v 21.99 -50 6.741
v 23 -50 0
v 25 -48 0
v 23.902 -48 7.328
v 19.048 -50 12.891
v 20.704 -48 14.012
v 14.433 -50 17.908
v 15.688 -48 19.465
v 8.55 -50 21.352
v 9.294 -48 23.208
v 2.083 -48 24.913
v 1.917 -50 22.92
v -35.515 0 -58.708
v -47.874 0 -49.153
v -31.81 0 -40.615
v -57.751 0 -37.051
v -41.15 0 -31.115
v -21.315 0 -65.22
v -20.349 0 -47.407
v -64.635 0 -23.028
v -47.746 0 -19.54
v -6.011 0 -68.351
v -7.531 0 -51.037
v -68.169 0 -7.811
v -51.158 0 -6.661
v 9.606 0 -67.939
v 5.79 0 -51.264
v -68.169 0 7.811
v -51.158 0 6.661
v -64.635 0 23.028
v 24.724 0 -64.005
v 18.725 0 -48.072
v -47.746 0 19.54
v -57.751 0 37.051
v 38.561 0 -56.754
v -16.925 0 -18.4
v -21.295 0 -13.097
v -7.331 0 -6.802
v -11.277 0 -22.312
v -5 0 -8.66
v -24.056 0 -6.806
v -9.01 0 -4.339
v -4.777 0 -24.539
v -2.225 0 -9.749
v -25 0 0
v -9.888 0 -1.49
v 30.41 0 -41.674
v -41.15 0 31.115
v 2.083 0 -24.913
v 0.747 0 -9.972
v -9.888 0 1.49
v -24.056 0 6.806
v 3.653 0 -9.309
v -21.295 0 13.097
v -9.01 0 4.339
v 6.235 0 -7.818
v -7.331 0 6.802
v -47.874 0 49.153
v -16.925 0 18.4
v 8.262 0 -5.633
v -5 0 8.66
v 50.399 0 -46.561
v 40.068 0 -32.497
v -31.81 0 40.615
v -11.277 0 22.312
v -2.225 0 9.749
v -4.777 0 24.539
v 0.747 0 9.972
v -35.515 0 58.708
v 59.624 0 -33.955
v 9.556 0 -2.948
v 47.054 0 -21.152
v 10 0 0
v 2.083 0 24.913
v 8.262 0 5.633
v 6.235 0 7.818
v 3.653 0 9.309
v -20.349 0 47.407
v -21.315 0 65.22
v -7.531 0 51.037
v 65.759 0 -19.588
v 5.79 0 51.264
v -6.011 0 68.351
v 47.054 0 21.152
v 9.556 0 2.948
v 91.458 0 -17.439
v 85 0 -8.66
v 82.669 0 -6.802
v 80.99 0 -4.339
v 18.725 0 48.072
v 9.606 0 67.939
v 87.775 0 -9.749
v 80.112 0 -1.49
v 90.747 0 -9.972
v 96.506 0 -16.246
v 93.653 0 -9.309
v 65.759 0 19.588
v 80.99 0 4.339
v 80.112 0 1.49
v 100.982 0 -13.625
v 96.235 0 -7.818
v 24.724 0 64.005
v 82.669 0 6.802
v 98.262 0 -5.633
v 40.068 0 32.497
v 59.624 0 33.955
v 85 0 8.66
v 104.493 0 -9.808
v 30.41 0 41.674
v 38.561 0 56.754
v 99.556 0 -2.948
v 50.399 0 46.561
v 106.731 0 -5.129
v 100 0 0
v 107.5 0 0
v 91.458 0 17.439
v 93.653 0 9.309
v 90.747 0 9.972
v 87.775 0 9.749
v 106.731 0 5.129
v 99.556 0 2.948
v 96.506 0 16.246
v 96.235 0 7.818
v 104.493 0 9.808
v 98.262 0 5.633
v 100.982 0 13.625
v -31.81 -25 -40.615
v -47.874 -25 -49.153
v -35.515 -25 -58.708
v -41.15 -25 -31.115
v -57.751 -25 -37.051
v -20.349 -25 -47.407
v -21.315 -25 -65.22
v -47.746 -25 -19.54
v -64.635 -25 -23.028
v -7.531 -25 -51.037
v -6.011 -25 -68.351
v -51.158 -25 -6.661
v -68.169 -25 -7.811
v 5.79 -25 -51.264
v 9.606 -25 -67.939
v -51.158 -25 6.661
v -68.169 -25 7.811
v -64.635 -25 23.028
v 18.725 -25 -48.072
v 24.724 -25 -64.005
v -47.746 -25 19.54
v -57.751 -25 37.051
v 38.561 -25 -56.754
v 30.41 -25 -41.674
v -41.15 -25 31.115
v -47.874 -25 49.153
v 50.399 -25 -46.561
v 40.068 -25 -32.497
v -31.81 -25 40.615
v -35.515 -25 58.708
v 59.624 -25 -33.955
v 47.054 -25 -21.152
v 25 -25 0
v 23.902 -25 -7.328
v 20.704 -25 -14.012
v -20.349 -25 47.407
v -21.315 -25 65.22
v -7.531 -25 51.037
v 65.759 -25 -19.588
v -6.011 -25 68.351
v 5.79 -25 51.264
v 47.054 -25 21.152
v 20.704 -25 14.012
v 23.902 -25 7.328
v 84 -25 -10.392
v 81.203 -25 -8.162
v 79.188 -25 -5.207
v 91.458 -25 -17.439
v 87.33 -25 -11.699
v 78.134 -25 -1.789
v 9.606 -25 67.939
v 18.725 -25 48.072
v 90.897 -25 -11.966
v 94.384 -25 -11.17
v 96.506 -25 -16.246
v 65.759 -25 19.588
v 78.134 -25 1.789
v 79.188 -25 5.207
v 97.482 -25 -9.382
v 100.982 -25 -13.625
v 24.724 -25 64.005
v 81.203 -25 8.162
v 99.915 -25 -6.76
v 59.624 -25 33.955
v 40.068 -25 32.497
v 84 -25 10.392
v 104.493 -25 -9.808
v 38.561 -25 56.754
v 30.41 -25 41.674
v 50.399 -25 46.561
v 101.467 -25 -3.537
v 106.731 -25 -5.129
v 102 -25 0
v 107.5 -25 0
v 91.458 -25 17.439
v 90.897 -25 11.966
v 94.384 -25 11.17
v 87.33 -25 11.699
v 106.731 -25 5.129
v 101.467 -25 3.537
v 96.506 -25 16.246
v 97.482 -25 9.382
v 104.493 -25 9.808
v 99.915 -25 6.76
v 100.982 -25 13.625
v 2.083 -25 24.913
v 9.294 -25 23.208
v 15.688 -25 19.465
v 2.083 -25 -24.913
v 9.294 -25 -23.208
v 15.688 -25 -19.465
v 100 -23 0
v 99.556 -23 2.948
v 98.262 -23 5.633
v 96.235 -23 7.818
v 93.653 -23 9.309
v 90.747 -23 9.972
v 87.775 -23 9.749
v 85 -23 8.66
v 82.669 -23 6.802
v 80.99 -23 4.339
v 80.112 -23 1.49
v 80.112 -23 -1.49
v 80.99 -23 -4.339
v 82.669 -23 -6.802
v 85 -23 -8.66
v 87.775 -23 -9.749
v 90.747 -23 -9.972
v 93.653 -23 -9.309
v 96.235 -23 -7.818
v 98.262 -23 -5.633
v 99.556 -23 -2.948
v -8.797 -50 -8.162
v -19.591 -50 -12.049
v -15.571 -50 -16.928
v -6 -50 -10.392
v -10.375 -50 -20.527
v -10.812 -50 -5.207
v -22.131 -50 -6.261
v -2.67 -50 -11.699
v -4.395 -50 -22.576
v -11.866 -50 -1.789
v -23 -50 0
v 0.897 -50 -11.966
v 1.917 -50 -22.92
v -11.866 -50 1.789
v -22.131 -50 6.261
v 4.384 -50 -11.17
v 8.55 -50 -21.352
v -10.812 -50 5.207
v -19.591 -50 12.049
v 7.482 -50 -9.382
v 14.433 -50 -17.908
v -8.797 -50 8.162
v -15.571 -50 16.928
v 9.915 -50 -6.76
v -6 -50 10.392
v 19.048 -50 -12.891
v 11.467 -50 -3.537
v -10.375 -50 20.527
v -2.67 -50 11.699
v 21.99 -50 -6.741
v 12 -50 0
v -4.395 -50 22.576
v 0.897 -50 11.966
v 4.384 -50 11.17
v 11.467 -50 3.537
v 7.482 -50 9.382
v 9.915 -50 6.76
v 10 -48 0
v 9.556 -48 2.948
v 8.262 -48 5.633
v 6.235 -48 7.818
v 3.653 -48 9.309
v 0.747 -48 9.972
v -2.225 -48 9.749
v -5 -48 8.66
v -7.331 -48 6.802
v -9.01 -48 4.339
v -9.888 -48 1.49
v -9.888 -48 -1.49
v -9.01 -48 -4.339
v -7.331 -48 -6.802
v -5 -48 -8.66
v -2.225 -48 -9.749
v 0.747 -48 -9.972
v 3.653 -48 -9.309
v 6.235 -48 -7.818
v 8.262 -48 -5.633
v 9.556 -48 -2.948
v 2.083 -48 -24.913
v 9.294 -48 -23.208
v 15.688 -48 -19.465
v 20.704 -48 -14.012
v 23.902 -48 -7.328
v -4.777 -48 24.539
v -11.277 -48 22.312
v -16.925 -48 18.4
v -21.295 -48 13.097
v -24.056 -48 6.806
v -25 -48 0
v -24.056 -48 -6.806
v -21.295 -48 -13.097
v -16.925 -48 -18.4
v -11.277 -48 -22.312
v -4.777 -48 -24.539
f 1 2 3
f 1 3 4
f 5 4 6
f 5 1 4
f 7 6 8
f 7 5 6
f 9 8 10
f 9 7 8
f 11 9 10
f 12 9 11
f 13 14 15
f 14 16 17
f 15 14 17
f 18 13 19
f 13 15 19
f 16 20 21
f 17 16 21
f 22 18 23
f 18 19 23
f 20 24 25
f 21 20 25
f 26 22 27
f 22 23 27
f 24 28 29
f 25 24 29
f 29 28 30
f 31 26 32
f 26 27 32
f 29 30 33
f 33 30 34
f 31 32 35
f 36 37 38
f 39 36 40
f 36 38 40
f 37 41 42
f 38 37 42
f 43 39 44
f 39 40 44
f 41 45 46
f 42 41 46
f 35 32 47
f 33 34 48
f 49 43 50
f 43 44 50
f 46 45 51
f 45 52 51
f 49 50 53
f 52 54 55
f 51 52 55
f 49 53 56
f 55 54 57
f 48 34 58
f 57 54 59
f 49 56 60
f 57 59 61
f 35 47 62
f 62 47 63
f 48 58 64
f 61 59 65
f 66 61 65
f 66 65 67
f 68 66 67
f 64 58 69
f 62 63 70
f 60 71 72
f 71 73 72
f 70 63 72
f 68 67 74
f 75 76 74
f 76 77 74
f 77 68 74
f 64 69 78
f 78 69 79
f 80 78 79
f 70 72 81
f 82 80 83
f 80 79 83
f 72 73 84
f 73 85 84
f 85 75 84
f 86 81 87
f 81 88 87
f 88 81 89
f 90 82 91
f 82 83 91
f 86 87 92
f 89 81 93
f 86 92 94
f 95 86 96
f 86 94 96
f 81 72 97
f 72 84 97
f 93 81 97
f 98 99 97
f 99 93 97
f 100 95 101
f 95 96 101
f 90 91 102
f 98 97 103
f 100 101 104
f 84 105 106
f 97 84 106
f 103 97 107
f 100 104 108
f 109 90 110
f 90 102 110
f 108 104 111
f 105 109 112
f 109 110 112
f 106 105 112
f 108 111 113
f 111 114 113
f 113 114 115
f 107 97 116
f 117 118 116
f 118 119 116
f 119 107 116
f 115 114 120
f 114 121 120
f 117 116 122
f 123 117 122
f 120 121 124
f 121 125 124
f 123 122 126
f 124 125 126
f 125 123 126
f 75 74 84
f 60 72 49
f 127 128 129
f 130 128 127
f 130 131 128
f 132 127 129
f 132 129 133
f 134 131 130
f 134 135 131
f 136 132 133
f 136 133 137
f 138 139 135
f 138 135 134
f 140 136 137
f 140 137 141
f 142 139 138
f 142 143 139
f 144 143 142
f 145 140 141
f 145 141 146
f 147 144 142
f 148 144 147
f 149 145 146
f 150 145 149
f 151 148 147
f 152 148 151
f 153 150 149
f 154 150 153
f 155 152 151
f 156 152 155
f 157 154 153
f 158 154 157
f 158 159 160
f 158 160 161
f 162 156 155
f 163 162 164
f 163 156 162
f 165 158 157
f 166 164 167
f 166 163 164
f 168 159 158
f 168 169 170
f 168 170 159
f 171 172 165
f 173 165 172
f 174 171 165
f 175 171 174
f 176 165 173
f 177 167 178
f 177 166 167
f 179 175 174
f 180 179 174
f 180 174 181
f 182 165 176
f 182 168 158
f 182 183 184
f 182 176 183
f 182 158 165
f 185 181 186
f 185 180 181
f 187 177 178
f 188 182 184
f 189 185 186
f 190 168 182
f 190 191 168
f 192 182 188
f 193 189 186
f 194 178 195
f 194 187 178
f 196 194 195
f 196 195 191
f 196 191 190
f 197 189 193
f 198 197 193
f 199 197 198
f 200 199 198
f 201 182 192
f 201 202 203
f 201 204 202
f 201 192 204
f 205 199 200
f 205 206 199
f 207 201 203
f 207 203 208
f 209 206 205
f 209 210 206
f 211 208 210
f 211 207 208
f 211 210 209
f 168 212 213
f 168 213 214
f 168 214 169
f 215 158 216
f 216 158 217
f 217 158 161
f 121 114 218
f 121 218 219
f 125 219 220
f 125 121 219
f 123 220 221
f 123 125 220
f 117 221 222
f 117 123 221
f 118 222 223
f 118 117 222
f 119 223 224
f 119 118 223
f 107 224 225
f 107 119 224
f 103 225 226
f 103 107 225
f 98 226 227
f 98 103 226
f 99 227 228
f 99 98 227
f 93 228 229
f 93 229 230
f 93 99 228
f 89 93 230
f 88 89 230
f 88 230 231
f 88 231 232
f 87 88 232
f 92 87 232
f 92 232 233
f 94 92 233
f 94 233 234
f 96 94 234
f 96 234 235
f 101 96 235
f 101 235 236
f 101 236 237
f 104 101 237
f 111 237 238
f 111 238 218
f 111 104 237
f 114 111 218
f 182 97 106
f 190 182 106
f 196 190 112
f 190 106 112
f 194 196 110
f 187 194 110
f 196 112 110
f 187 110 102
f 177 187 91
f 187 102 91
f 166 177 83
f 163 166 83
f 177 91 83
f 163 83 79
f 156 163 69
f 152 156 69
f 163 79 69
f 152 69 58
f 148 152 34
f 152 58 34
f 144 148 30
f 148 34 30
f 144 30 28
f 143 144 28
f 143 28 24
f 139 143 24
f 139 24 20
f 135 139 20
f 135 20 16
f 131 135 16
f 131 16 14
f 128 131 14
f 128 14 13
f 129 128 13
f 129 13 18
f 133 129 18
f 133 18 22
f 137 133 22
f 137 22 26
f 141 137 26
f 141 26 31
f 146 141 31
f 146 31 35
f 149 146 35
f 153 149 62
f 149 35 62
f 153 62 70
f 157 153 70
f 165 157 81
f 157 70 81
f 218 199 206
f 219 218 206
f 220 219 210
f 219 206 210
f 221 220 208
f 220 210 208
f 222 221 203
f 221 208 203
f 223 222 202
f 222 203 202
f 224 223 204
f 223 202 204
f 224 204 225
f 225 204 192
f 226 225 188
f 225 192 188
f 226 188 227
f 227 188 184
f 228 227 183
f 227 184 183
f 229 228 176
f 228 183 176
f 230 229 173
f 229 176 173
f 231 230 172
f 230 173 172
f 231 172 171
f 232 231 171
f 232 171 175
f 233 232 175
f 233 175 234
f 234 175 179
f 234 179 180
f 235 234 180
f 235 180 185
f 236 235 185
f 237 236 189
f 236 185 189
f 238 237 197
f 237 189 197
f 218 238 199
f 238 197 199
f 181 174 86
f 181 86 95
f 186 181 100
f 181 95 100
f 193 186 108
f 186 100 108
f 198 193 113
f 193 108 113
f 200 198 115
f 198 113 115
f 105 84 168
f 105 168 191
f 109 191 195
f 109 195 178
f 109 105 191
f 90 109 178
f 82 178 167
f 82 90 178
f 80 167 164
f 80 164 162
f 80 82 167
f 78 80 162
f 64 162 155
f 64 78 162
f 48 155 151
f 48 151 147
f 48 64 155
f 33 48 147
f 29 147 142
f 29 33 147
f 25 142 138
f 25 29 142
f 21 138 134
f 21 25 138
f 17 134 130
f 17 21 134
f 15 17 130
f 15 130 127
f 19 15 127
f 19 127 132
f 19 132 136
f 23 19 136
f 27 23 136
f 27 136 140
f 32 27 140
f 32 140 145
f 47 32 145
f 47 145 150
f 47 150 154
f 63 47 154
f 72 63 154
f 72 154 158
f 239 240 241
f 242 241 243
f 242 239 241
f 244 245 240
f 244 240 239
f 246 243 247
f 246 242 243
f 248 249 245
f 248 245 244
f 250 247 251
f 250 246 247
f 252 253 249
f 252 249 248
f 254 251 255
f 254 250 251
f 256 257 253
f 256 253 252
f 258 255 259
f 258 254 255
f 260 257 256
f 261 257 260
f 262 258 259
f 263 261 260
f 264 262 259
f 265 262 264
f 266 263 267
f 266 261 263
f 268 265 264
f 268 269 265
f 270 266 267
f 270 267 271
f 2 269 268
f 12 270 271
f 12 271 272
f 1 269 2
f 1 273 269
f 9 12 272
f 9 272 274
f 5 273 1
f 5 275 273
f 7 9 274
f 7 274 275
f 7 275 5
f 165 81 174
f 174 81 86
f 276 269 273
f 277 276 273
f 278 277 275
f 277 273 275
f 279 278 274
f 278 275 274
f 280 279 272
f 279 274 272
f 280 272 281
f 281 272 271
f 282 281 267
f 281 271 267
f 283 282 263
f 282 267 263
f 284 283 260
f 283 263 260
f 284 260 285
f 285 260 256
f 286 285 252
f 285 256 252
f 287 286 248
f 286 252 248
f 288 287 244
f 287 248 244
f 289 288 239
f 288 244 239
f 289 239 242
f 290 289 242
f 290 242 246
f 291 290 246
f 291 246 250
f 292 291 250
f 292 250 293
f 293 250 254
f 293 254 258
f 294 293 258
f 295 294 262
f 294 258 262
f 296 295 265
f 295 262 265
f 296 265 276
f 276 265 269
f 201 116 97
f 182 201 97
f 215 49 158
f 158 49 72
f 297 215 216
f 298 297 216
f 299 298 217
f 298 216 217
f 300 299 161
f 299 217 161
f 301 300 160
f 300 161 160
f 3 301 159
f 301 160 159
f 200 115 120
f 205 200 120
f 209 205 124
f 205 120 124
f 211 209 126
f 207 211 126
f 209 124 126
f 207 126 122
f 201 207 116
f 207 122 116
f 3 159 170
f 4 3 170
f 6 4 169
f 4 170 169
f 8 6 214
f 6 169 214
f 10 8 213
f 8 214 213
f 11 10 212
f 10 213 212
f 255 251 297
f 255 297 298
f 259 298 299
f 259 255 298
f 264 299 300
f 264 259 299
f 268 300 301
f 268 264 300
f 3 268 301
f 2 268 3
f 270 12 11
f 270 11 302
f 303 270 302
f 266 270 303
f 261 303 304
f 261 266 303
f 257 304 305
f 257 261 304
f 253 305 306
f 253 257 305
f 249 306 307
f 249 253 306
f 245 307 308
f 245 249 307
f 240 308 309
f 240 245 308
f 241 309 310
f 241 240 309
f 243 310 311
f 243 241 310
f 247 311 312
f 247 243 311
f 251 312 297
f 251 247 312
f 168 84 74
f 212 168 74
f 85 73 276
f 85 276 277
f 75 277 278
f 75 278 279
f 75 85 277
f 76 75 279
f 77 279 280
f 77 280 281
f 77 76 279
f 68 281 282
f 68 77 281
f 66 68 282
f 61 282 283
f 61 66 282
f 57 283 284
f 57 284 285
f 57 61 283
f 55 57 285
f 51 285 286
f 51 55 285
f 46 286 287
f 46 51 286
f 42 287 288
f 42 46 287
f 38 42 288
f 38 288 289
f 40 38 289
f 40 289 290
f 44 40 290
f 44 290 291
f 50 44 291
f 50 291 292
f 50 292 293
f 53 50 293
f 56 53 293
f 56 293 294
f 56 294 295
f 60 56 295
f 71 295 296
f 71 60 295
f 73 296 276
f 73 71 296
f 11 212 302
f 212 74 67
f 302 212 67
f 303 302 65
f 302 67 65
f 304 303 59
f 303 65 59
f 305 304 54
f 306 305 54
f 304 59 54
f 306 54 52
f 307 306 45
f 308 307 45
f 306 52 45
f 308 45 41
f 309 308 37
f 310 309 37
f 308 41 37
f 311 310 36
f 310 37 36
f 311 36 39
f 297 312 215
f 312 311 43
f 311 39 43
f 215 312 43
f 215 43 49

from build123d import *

# Parameters (mm, degrees)
F0_R     = 10
F1_DEPTH = 25
F2_DEPTH = 50
F3_SIZE  = 2
F4_R     = 68.61461
F4_R_2   = 51.589695
F5_DEPTH = 25


with BuildPart() as f1:
    # F0 (on Front) → F1 (new body)
    with BuildSketch(Plane.XZ):
        with BuildLine():
            ThreePointArc((2.083333, -24.913043), (18.399502, -16.92508), (25, 0))
            ThreePointArc((25, 0), (18.399502, 16.92508), (2.083333, 24.913043))
            ThreePointArc((2.083333, 24.913043), (-25, 0), (2.083333, -24.913043))
        make_face()
        Circle(F0_R, mode=Mode.SUBTRACT)
        with BuildLine():
            ThreePointArc((2.083333, 24.913043), (18.399502, 16.92508), (25, 0))
            ThreePointArc((25, 0), (18.399502, -16.92508), (2.083333, -24.913043))
            Line((2.083333, -24.913043), (91.458333, -17.43913))
            ThreePointArc((91.458333, -17.43913), (72.5, 0), (91.458333, 17.43913))
            Line((91.458333, 17.43913), (2.083333, 24.913043))
        make_face()
        with BuildLine():
            ThreePointArc((107.5, 0), (102.879651, 11.847556), (91.458333, 17.43913))
            ThreePointArc((91.458333, 17.43913), (72.5, 0), (91.458333, -17.43913))
            ThreePointArc((91.458333, -17.43913), (102.879651, -11.847556), (107.5, 0))
        make_face()
        with Locations((90, 0)):
            Circle(F0_R, mode=Mode.SUBTRACT)
    extrude(amount=F1_DEPTH)

    # F0 (on Front) → F2 (join)
    with BuildSketch(Plane.XZ):
        with BuildLine():
            ThreePointArc((2.083333, -24.913043), (18.399502, -16.92508), (25, 0))
            ThreePointArc((25, 0), (18.399502, 16.92508), (2.083333, 24.913043))
            ThreePointArc((2.083333, 24.913043), (-25, 0), (2.083333, -24.913043))
        make_face()
        Circle(F0_R, mode=Mode.SUBTRACT)
    extrude(amount=F2_DEPTH)

    # F3
    f3_edges = [f1.edges().sort_by_distance(p)[0] for p in [
        (-2.083333, -50, 24.913043),
        (-10, -50, 0),
        (80, -25, 0),
    ]]
    chamfer(f3_edges, length=F3_SIZE)

    # F4 (on Front) → F5 (join)
    with BuildSketch(Plane.XZ):
        Circle(F4_R)
        Circle(F4_R_2, mode=Mode.SUBTRACT)
    extrude(amount=F5_DEPTH)


solid = f1.part
